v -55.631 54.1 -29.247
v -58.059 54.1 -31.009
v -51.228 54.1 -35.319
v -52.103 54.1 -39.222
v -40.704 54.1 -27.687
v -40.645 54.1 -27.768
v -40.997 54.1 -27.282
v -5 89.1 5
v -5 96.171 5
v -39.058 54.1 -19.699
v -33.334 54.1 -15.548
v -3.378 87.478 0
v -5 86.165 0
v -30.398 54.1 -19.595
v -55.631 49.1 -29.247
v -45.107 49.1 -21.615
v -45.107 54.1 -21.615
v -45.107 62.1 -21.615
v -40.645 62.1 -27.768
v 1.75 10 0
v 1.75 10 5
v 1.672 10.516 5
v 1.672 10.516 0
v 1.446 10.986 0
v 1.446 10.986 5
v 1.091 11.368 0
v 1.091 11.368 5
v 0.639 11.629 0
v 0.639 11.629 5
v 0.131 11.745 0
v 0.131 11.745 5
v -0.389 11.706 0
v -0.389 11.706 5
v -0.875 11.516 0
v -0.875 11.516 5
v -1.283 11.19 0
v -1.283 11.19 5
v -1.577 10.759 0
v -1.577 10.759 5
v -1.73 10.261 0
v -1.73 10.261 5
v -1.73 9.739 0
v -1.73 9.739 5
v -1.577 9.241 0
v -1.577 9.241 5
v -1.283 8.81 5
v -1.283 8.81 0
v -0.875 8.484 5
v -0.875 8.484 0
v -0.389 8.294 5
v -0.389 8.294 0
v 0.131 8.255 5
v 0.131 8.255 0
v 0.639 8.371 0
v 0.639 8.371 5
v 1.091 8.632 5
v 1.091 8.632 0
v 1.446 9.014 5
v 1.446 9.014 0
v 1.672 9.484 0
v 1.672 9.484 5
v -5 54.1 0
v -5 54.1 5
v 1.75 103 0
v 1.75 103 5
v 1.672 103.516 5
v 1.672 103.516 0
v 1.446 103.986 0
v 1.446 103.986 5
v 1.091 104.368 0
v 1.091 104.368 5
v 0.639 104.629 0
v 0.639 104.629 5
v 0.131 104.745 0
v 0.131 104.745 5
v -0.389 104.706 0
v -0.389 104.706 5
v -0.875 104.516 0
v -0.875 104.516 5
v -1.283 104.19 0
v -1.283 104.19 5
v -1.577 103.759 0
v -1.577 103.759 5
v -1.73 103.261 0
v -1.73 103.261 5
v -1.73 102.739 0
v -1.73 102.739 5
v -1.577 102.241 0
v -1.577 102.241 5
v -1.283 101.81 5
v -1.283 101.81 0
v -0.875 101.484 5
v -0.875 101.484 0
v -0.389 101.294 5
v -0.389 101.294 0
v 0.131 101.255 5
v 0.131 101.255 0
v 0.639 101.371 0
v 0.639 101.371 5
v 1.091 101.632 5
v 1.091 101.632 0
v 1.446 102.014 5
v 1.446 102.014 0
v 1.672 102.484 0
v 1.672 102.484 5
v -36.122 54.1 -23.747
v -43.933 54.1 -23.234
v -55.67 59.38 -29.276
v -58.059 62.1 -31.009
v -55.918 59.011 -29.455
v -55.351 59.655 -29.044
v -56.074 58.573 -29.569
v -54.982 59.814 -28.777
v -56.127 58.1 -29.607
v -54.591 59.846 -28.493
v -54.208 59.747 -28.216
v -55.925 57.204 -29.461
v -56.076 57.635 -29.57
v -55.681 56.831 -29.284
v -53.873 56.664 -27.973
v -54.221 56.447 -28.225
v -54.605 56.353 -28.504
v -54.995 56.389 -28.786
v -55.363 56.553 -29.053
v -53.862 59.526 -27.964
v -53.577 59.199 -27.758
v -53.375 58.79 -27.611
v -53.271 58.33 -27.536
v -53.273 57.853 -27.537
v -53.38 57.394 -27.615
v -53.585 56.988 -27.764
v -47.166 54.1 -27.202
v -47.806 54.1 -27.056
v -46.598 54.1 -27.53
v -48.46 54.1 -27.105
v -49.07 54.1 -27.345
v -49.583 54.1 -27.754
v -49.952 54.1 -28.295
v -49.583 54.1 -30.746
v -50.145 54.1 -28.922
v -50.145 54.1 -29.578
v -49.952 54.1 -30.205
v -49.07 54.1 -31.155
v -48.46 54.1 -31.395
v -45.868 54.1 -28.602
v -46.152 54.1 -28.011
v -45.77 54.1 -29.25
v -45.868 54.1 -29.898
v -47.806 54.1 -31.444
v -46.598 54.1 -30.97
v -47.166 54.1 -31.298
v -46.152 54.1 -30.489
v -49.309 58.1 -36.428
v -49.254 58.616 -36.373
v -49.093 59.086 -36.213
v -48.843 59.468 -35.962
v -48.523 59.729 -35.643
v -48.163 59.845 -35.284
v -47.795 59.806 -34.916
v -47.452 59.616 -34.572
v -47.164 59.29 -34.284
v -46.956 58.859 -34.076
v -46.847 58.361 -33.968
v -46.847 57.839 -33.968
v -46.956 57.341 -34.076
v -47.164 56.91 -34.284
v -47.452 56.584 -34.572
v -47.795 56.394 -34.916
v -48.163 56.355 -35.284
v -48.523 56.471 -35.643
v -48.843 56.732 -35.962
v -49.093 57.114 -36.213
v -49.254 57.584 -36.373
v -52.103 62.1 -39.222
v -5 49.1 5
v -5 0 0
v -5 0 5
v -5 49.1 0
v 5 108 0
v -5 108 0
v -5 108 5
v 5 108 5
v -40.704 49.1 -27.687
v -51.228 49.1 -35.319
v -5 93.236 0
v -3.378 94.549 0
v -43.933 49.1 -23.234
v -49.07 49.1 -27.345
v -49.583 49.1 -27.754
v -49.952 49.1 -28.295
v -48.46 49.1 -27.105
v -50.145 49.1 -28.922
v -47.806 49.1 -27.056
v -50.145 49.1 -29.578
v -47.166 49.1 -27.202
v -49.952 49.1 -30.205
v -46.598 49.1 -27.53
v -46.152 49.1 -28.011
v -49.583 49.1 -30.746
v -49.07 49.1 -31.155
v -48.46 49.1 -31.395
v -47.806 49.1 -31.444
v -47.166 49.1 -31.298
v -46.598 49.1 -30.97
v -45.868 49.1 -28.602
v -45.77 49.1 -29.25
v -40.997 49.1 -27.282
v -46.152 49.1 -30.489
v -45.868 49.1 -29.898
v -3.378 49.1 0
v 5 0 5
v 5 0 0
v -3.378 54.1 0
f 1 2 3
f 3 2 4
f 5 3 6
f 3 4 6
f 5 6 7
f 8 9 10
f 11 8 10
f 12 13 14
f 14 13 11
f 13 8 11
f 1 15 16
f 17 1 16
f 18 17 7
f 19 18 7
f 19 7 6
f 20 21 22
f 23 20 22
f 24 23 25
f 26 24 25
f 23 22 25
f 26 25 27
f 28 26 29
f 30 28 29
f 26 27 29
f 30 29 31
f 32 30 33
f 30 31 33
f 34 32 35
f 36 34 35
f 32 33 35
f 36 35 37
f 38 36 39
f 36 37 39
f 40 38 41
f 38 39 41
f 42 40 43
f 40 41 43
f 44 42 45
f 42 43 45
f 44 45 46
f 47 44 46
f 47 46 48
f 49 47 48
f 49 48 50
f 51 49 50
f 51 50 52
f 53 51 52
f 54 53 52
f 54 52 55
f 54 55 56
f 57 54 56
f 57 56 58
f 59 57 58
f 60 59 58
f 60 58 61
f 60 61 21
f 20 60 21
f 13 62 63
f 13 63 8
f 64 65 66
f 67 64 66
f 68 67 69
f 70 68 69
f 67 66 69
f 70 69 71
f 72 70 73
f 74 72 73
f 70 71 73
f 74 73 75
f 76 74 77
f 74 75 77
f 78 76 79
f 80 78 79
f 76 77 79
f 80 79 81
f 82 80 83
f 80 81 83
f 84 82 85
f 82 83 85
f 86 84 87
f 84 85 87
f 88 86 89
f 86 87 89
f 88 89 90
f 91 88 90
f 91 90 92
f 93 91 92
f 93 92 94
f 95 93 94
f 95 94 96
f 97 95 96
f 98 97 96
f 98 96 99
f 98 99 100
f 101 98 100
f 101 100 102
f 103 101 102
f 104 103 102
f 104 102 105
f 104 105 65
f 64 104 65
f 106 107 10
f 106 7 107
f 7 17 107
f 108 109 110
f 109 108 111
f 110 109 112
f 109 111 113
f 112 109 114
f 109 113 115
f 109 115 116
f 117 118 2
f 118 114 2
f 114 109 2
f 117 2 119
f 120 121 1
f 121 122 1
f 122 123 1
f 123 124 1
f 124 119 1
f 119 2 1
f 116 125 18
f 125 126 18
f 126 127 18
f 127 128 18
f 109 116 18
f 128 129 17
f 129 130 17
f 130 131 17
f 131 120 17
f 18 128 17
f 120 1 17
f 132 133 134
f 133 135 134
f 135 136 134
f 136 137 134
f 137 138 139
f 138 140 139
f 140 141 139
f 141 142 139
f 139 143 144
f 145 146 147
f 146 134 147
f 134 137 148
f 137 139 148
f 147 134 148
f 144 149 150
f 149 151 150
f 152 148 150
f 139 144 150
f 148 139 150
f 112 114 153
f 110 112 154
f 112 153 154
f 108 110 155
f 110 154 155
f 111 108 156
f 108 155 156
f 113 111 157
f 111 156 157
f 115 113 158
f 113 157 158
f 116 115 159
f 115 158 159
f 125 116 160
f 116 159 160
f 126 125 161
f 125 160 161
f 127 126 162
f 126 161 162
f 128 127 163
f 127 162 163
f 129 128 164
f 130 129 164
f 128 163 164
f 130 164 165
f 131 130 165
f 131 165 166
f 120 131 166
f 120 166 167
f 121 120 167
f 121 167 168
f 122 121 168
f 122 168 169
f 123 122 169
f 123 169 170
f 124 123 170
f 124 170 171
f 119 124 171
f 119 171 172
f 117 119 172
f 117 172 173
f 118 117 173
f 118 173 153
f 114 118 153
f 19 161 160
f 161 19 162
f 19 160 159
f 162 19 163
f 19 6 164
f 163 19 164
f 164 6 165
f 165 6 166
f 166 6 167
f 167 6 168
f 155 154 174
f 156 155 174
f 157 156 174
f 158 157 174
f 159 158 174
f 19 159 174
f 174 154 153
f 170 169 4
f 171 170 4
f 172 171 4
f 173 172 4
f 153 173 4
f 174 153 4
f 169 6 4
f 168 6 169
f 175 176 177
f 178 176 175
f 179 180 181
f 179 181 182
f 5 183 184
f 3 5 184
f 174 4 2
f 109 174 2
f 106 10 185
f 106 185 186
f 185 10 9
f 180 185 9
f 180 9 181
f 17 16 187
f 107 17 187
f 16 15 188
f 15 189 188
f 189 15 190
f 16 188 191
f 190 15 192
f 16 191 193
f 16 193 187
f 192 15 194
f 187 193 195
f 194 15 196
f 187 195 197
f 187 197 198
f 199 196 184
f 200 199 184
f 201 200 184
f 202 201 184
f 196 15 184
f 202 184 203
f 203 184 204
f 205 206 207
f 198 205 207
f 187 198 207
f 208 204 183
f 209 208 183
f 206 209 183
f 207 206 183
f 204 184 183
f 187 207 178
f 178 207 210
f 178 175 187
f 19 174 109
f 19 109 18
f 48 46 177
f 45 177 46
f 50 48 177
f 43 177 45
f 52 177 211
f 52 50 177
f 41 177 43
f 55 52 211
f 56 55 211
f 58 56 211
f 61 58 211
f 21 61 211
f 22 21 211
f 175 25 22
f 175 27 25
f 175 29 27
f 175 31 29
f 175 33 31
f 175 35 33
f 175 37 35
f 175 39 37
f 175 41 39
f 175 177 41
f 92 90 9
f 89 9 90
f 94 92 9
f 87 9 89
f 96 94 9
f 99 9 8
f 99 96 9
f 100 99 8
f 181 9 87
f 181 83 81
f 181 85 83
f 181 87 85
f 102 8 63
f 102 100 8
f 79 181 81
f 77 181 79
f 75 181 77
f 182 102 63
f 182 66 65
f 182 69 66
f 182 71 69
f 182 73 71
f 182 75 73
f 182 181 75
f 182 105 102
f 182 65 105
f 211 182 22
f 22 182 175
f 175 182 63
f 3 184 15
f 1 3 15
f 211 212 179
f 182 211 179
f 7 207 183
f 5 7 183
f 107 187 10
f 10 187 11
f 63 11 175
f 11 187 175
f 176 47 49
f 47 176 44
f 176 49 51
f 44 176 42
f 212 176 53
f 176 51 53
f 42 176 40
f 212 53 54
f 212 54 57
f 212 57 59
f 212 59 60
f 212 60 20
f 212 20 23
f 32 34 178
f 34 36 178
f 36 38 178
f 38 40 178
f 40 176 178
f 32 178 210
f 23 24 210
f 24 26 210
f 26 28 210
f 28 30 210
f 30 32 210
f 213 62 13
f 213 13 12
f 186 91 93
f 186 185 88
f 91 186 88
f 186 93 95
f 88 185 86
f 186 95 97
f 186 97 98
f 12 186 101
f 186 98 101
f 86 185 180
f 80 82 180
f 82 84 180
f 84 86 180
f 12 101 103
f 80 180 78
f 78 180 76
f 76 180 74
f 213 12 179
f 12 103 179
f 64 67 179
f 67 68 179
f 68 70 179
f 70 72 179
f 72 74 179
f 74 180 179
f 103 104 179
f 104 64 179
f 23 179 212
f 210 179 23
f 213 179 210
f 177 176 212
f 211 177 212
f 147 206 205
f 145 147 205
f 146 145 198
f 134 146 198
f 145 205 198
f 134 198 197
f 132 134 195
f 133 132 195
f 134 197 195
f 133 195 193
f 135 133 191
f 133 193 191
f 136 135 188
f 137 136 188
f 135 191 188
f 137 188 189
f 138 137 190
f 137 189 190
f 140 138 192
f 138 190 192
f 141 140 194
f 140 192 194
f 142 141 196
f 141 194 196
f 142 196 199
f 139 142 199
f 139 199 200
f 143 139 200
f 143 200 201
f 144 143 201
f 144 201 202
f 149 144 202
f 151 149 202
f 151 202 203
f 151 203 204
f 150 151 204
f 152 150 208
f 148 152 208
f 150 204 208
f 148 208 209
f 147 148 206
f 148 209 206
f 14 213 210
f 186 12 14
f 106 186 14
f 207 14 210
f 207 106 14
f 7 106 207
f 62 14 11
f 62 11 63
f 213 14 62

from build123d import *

# Parameters (mm, degrees)
SKETCH1_W           = 10
SKETCH1_H           = 108
BOSS_EXTRUDE1_DEPTH = 5
SKETCH2_R           = 1.75
CUT_EXTRUDE1_DEPTH  = 109.231233939
BOSS_EXTRUDE2_DEPTH = 5
SKETCH5_R           = 2.2
CUT_EXTRUDE2_DEPTH  = 5
BOSS_EXTRUDE3_REACH = 128.484
BOSS_EXTRUDE4_DEPTH = 8
SKETCH8_R           = 1.75
CUT_EXTRUDE3_DEPTH  = 129.116541509


with BuildPart() as part:
    # Sketch1 → Boss-Extrude1 (new body)
    with BuildSketch(Plane.XY):
        with Locations((0, 54)):
            Rectangle(SKETCH1_W, SKETCH1_H)
    extrude(amount=BOSS_EXTRUDE1_DEPTH)

    # Sketch2 → Cut-Extrude1 (cut, through all)
    with BuildSketch(Plane.XY.offset(5)):
        with Locations((0, 10)):
            Circle(SKETCH2_R)
        with Locations((0, 103)):
            Circle(SKETCH2_R)
    extrude(amount=-CUT_EXTRUDE1_DEPTH, mode=Mode.SUBTRACT)

    # Sketch4 → Boss-Extrude2 (add)
    with BuildSketch(Plane(origin=(0, 49.1, 0), x_dir=(-1, 0, 0), z_dir=(0, -1, 0))):
        Polygon((3.377813163, 0), (40.9972684, 27.282007374), (40.703728886, 27.686772187), (51.227614019, 35.318799552), (55.63070673, 29.247327359), (45.106791947, 21.615278492), (43.932633891, 23.234337744), (5, -5), align=None)
    extrude(amount=-BOSS_EXTRUDE2_DEPTH)

    # Sketch5 → Cut-Extrude2 (cut)
    with BuildSketch(Plane.XZ.offset(-49.1)):
        with Locations((-47.97, -29.25)):
            Circle(SKETCH5_R)
    extrude(amount=-CUT_EXTRUDE2_DEPTH, mode=Mode.SUBTRACT)

    # Boss-Extrude3: up to this face of the body (flat: up to its plane)
    boss_extrude3_end = Plane(part.part.faces().sort_by_distance((-22.187540781, 51.6, -13.641003687))[0])
    # Sketch6 → Boss-Extrude3 (add, up to the picked face)
    with BuildSketch(Plane(origin=(-4.099598255, 0, 5.652980403), x_dir=(0.8095296256563876, 0, 0.5870790280572362), z_dir=(-0.5870790280572362, 0, 0.8095296256563876)), mode=Mode.PRIVATE) as boss_extrude3_sk1:
        Polygon((-43.1833208, 54.1), (-1.112252988, 96.171067812), (-1.112252988, 89.1), (-36.112252988, 54.1), align=None)
    boss_extrude3_tool1 = split(extrude(boss_extrude3_sk1.sketch, amount=-BOSS_EXTRUDE3_REACH, mode=Mode.PRIVATE), bisect_by=boss_extrude3_end, keep=Keep.BOTH, mode=Mode.PRIVATE)
    add(boss_extrude3_tool1.solids().sort_by(Axis((-20.641593, 73.42183, -6.343441), (0.5870790280572362, 0, -0.8095296256563876)))[0])

    # Sketch7 → Boss-Extrude4 (add)
    with BuildSketch(Plane(origin=(0, 54.1, 0), x_dir=(1, 0, 0), z_dir=(0, 1, 0))):
        Polygon((-40.645020983, 27.767725149), (-52.102962866, 39.221816124), (-58.059295607, 31.008564443), (-45.106791947, 21.615278492), align=None)
    extrude(amount=BOSS_EXTRUDE4_DEPTH)

    # Sketch8 → Cut-Extrude3 (cut, through all)
    with BuildSketch(Plane(origin=(-6.431817345, 0, 6.433979746), x_dir=(-0.7072256172064263, 0, -0.7069879251917881), z_dir=(0.7069879251917881, 0, -0.7072256172064263))):
        with Locations((58.876646442, 58.1)):
            Circle(SKETCH8_R)
    extrude(amount=-CUT_EXTRUDE3_DEPTH, mode=Mode.SUBTRACT)


solid = part.part
